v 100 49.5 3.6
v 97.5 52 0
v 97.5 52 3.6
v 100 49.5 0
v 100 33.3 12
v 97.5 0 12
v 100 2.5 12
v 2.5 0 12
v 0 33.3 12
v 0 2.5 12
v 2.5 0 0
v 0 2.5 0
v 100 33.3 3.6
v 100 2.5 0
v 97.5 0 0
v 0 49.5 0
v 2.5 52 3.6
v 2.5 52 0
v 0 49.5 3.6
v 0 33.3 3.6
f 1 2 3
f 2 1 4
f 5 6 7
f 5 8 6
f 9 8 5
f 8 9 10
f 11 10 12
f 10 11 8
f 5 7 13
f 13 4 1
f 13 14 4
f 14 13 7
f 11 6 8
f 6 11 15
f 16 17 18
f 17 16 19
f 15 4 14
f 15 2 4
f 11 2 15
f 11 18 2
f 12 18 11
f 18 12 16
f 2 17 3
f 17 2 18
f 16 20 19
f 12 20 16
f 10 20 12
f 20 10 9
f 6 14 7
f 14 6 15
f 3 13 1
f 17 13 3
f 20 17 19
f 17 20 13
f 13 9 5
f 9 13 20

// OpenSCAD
$fn = 32;

// ----------------------------------------------------------------------
// Stepped bar: sidestep, 100 x 52 x 12/3.6 mm
// ----------------------------------------------------------------------

// --- parameters (mm) ---
bar_l = 100;              // bar length, X
bar_w = 52;               // bar width, Y
plate_t = 12;             // thickness of the thick zone, Z
thin_t = 3.6;             // thickness of the thin zone
corner_c = 2.5;           // corner chamfer of the bar
step_cut = 8.4;           // material removed from the thin zone
ledge_y = 33.3;           // start of the ledge from the front edge
depth_1 = 8.4;            // depth of cut 1 from the top face

profile = [[2.5, 0], [97.5, 0], [100, 2.5], [100, 49.5], [97.5, 52], [2.5, 52], [0, 49.5], [0, 2.5]];  // primary outline, 8 points, counter clockwise
void_1 = [[-1, 33.3], [101, 33.3], [101, 53], [-1, 53]];  // ledge cut along one edge, 4 points

// --- the one profile operation ---
difference() {
  linear_extrude(height = plate_t) polygon(points = profile);
  translate([0, 0, plate_t - depth_1])
    linear_extrude(height = depth_1 + 1) polygon(points = void_1);
}
